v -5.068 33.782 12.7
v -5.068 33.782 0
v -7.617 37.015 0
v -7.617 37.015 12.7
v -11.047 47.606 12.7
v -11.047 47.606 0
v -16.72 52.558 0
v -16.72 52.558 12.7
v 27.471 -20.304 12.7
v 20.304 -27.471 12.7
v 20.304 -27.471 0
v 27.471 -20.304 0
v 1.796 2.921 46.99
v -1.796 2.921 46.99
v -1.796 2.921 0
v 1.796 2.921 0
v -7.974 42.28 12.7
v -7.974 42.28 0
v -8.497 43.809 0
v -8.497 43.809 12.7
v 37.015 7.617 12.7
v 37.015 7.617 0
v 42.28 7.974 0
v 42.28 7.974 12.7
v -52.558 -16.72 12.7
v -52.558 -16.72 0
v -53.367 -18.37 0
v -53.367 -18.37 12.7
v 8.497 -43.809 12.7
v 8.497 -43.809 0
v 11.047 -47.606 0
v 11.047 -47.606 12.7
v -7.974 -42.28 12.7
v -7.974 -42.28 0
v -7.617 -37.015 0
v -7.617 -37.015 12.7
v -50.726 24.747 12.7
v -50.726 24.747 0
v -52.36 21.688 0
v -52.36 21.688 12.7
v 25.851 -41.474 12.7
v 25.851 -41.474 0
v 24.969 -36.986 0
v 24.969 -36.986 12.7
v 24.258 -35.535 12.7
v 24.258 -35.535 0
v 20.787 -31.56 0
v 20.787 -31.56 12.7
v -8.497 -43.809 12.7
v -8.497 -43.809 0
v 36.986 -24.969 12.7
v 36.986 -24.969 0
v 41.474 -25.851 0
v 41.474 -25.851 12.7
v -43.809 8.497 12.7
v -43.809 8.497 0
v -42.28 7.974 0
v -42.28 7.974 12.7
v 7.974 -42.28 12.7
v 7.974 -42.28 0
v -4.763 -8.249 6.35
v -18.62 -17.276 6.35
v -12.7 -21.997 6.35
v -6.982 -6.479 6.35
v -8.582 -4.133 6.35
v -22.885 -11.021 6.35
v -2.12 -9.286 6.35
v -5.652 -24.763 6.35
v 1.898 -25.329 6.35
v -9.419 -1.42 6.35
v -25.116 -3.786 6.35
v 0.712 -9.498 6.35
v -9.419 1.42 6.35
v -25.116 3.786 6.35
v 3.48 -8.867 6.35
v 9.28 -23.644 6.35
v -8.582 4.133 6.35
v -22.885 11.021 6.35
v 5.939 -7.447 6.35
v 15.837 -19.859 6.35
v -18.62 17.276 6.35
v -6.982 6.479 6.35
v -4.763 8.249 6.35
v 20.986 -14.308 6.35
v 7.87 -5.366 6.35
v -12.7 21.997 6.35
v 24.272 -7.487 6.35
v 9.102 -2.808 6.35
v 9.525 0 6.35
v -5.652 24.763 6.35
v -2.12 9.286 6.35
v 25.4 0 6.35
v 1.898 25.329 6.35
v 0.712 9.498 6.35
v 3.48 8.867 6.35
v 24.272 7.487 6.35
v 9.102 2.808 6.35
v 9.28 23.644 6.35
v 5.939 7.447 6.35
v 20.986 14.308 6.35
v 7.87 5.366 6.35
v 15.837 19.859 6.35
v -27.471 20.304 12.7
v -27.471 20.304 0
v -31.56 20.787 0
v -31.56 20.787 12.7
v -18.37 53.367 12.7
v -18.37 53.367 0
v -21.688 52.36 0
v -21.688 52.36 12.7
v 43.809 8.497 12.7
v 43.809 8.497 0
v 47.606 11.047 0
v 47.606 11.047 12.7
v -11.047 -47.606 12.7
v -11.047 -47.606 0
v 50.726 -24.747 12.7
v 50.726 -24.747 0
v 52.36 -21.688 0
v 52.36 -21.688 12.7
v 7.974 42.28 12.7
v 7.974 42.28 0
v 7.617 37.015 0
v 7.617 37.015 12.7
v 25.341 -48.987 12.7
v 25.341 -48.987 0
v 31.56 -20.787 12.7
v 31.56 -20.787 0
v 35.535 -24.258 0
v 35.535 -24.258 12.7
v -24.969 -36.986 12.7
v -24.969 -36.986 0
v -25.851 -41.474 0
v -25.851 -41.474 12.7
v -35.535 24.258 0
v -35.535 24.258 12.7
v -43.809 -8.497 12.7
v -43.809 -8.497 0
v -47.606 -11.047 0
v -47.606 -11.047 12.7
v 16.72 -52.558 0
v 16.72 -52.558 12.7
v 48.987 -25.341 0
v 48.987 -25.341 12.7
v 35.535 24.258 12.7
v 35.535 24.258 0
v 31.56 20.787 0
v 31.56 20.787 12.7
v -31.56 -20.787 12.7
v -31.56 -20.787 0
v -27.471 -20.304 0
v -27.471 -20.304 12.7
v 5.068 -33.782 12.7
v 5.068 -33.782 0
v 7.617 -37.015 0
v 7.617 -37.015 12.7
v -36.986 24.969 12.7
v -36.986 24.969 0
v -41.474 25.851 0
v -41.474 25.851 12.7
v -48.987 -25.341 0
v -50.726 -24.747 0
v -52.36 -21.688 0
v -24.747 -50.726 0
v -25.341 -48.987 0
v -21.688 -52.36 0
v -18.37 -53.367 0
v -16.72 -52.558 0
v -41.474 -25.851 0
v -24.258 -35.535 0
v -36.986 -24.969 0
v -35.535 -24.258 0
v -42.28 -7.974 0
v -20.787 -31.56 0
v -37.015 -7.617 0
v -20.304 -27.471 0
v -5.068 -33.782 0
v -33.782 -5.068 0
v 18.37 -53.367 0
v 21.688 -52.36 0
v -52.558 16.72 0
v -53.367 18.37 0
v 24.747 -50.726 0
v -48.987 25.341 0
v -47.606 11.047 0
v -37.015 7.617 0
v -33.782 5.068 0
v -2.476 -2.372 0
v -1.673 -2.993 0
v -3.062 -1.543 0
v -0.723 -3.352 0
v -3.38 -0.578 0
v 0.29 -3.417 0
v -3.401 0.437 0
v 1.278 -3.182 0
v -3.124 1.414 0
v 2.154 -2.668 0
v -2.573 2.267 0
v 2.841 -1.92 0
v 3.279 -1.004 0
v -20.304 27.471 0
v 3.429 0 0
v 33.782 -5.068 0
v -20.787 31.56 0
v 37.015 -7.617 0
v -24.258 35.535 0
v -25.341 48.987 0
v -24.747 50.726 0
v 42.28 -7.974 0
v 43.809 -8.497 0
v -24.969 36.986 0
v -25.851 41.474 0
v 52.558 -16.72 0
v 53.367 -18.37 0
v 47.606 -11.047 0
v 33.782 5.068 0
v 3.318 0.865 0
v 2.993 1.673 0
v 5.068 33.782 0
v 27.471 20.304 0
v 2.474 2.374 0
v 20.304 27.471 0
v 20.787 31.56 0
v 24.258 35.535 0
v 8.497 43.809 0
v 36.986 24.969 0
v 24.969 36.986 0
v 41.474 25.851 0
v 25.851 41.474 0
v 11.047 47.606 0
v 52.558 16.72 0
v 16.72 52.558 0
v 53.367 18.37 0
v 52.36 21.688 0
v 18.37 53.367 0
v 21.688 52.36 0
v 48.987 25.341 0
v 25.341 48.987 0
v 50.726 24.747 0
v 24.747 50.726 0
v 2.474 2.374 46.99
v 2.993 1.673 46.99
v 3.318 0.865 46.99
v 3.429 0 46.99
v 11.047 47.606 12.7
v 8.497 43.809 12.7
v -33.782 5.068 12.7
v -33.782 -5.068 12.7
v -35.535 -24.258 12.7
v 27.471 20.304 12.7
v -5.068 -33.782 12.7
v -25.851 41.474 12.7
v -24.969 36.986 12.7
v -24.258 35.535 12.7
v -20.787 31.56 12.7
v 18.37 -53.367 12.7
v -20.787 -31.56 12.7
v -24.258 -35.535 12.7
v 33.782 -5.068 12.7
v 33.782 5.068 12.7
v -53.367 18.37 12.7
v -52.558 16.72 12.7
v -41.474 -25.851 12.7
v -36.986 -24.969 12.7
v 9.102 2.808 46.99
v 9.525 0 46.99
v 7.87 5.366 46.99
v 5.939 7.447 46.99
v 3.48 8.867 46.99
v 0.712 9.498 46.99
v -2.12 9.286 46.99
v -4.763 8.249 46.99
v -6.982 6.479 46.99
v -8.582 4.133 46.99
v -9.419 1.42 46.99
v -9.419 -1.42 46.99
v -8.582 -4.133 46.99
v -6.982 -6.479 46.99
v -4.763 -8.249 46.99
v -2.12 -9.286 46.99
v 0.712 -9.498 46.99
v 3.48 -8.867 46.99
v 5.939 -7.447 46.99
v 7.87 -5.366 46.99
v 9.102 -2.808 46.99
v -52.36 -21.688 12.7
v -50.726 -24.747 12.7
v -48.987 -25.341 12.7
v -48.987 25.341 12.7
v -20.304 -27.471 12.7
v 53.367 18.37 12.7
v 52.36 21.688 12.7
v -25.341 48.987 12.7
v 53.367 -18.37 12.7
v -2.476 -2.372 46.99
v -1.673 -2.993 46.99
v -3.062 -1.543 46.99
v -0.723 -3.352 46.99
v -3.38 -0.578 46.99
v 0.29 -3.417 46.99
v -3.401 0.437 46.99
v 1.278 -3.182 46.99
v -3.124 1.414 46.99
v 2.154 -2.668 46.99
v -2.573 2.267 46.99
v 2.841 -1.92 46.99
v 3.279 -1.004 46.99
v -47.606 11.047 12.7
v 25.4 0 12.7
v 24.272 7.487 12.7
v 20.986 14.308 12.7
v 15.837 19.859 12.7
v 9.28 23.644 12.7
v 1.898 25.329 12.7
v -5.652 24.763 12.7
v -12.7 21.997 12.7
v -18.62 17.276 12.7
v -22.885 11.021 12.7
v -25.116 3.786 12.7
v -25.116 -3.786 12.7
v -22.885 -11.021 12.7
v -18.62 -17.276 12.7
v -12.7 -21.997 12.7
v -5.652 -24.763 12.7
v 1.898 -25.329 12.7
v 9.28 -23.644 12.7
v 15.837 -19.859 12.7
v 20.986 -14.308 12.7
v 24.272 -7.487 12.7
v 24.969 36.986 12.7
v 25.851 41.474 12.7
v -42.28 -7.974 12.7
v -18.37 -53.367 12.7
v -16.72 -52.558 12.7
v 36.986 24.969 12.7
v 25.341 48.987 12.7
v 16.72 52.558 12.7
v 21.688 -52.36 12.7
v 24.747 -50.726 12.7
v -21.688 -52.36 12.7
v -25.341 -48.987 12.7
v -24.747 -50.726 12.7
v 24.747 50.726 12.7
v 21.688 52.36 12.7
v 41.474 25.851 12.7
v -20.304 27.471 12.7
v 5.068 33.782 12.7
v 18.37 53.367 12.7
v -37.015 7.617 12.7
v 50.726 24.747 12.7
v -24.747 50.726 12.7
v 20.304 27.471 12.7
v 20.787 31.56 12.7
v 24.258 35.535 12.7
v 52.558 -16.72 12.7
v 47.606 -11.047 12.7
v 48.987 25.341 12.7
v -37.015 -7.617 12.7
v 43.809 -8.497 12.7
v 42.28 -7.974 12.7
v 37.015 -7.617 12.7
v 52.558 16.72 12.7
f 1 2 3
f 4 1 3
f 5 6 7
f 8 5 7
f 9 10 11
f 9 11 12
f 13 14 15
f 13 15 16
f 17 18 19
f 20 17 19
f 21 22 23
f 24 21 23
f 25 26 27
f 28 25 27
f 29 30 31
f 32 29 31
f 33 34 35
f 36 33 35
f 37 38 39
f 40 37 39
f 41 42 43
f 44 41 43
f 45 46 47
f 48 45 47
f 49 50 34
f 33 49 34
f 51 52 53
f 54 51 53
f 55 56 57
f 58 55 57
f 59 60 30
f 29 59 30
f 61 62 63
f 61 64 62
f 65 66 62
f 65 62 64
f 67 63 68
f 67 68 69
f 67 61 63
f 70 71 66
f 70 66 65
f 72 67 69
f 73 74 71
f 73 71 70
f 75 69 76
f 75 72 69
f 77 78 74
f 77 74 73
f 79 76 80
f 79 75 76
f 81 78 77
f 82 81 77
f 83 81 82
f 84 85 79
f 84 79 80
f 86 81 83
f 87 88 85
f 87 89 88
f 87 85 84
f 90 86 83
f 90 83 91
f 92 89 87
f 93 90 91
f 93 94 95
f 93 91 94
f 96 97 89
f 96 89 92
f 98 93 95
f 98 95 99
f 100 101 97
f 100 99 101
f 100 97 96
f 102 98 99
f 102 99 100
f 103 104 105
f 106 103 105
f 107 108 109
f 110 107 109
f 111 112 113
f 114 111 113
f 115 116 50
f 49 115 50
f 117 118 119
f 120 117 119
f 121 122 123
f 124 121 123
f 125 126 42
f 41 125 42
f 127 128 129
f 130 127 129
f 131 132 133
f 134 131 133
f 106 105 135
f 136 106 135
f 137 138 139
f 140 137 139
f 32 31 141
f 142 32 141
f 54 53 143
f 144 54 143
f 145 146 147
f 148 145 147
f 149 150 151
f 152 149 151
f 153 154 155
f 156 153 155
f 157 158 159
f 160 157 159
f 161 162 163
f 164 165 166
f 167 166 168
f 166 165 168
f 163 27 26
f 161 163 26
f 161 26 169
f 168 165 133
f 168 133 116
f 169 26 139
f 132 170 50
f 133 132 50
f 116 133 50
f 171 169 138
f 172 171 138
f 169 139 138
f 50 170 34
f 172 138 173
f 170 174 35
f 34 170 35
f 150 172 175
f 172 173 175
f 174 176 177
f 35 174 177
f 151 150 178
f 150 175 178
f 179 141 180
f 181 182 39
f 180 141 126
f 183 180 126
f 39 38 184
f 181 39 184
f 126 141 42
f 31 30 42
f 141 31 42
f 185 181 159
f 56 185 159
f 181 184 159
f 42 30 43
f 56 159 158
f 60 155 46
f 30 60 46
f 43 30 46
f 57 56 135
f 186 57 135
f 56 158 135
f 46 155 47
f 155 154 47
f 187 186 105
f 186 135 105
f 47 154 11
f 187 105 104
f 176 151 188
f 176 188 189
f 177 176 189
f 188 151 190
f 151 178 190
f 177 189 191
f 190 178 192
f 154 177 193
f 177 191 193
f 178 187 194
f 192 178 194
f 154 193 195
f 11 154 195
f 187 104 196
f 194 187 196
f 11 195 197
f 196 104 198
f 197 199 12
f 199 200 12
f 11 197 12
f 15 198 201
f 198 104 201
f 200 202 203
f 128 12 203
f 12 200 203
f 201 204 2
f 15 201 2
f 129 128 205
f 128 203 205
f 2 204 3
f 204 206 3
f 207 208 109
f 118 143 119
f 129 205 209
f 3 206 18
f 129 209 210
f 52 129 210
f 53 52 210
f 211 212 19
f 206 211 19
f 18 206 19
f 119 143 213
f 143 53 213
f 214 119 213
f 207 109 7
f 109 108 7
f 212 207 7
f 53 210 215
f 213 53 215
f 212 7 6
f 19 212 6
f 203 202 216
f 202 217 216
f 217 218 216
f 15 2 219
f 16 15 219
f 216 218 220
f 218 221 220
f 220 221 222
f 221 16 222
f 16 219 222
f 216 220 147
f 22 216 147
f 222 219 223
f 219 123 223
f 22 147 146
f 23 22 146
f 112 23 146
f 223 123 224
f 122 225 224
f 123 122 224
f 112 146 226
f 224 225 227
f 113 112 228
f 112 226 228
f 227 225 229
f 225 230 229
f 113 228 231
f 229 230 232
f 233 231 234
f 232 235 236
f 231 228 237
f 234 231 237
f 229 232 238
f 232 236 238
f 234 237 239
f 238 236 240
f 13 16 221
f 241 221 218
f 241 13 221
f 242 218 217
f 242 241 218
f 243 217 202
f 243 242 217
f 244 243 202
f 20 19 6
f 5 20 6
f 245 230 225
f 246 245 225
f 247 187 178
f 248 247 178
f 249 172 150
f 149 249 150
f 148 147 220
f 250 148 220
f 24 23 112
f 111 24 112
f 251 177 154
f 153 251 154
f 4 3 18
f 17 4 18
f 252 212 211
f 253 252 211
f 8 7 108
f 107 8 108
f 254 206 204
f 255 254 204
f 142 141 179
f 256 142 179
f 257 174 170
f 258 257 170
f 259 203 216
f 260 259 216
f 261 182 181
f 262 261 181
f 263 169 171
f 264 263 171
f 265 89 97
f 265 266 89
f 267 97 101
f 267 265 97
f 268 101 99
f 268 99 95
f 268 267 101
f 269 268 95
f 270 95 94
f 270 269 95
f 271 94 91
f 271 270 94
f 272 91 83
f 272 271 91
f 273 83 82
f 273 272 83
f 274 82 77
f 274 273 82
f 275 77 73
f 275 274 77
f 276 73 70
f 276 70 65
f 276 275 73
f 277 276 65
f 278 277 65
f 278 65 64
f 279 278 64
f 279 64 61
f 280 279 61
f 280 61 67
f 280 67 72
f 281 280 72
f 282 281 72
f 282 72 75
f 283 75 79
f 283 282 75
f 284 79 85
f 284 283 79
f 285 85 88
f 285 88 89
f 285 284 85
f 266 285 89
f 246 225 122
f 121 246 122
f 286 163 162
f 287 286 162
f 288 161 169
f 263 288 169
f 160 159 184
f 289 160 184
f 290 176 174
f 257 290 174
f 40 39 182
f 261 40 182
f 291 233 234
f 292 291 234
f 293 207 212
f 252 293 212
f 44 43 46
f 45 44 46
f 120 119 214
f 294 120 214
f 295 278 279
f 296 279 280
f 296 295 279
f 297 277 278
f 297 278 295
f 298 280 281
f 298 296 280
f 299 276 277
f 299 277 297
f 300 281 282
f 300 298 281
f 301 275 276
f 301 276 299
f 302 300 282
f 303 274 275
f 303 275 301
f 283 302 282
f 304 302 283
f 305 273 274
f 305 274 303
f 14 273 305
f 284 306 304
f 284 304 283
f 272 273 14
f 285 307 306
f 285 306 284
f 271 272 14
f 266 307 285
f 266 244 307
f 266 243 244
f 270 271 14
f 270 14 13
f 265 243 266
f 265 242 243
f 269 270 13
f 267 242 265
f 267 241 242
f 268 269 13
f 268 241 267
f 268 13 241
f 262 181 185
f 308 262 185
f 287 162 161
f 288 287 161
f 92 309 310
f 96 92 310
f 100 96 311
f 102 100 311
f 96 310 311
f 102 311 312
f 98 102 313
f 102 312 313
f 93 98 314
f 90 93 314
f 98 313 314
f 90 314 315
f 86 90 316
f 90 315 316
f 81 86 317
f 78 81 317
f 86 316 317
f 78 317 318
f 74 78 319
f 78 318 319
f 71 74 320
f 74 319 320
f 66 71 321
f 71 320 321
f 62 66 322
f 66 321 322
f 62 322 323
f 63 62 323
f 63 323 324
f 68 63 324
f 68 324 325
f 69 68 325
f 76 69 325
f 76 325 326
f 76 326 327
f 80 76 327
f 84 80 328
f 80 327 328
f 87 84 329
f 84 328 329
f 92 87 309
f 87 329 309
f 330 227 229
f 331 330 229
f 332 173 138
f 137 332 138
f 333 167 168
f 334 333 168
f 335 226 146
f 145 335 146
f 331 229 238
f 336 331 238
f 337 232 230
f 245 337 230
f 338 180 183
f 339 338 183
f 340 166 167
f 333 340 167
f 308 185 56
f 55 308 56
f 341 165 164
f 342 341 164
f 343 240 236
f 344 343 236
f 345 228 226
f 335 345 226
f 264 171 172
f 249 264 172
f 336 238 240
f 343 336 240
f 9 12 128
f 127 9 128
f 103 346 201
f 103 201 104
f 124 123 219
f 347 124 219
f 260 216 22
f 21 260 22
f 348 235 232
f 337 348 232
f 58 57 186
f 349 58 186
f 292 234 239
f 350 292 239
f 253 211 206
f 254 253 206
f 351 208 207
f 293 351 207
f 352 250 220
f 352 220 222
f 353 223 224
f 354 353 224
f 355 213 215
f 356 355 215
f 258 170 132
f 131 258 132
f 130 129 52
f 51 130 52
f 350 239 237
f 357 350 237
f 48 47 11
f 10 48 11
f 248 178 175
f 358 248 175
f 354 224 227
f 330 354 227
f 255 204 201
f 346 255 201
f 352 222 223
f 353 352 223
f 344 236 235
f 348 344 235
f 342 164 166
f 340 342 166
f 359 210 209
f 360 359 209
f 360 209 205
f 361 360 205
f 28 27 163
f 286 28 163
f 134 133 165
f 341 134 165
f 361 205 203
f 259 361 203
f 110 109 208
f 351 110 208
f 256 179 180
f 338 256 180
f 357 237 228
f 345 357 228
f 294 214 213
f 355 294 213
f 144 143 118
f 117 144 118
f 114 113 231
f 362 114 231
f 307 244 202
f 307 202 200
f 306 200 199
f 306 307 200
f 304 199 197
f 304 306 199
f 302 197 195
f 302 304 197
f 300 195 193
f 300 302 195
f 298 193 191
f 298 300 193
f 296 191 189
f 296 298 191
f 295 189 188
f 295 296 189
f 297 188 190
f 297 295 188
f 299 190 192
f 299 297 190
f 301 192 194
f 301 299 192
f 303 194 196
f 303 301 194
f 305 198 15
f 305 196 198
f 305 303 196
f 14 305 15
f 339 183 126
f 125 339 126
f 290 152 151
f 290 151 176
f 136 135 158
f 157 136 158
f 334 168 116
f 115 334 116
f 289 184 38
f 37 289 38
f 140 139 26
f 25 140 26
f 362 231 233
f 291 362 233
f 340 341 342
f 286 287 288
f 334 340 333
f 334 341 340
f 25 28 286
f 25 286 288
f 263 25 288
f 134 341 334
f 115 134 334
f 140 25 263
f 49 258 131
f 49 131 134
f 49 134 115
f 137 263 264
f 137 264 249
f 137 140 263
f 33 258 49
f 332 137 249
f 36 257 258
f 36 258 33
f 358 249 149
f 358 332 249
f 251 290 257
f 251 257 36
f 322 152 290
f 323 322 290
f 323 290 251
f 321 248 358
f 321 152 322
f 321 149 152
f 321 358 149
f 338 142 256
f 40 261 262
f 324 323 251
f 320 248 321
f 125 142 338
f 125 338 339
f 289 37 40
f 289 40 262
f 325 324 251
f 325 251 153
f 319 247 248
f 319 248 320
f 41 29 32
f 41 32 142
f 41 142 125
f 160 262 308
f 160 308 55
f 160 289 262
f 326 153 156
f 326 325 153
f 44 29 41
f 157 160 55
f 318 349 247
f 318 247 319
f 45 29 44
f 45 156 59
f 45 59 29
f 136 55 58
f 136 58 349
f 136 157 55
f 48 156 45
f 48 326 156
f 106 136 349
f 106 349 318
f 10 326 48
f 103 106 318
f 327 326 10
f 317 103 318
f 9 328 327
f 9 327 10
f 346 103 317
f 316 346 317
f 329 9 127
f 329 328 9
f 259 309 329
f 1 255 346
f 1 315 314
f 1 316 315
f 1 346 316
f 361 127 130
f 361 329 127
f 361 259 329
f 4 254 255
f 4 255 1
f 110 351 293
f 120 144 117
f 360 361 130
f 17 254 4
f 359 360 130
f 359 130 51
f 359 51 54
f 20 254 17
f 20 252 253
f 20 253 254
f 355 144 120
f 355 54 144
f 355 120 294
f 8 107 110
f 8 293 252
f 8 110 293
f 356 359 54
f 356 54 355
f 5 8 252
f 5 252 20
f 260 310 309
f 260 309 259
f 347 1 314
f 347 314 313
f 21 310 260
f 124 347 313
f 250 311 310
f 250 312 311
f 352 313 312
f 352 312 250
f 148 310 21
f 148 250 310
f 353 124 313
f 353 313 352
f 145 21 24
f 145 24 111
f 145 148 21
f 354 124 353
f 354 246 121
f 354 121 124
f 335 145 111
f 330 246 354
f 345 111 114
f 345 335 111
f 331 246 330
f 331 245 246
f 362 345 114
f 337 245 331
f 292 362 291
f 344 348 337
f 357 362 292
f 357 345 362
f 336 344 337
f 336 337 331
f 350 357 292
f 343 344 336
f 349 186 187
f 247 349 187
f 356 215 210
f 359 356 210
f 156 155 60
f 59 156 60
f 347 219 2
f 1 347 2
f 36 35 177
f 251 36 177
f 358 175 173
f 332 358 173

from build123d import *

# Parameters (mm, degrees)
F1_DEPTH = 12.7
F2_R     = 9.525
F3_DEPTH = 34.29
F4_DEPTH = 25.4
F2_R_2   = 25.4
F5_DEPTH = 6.35


with BuildPart() as f1:
    # F0 (on Top) → F1 (new body)
    with BuildSketch(Plane.XY):
        Polygon((-48.986719159, 25.3412460777), (-50.7255351294, 24.7465363945), (-52.3601977854, 21.688304154), (-53.366815822, 18.3699267661), (-52.5578082129, 16.719871907), (-47.6057296253, 11.0468524364), (-43.80914346, 8.4974130761), (-42.2801519731, 7.9744654227), (-37.0147232049, 7.6171909331), (-33.782, 5.0679251692), (-33.782, -5.0679251692), (-37.0147232049, -7.6171909331), (-42.2801519731, -7.9744654227), (-43.80914346, -8.4974130761), (-47.6057296253, -11.0468524364), (-52.5578082129, -16.719871907), (-53.366815822, -18.3699267661), (-52.3601977854, -21.688304154), (-50.7255351294, -24.7465363945), (-48.986719159, -25.3412460777), (-41.4736370284, -25.8510271212), (-36.9863201834, -24.9691669416), (-35.5353802528, -24.2577827562), (-31.559527, -20.7871925925), (-27.4710453735, -20.303918365), (-20.303918365, -27.4710453735), (-20.7871925925, -31.559527), (-24.2577827562, -35.5353802528), (-24.9691669416, -36.9863201834), (-25.8510271212, -41.4736370284), (-25.3412460777, -48.986719159), (-24.7465363945, -50.7255351294), (-21.688304154, -52.3601977854), (-18.3699267661, -53.366815822), (-16.719871907, -52.5578082129), (-11.0468524364, -47.6057296253), (-8.4974130761, -43.80914346), (-7.9744654227, -42.2801519731), (-7.6171909331, -37.0147232049), (-5.0679251692, -33.782), (5.0679251692, -33.782), (7.6171909331, -37.0147232049), (7.9744654227, -42.2801519731), (8.4974130761, -43.80914346), (11.0468524364, -47.6057296253), (16.719871907, -52.5578082129), (18.3699267661, -53.366815822), (21.688304154, -52.3601977854), (24.7465363945, -50.7255351294), (25.3412460777, -48.986719159), (25.8510271212, -41.4736370284), (24.9691669416, -36.9863201834), (24.2577827562, -35.5353802528), (20.7871925925, -31.559527), (20.303918365, -27.4710453735), (27.4710453735, -20.303918365), (31.559527, -20.7871925925), (35.5353802528, -24.2577827562), (36.9863201834, -24.9691669416), (41.4736370284, -25.8510271212), (48.986719159, -25.3412460777), (50.7255351294, -24.7465363945), (52.3601977854, -21.688304154), (53.366815822, -18.3699267661), (52.5578082129, -16.719871907), (47.6057296253, -11.0468524364), (43.80914346, -8.4974130761), (42.2801519731, -7.9744654227), (37.0147232049, -7.6171909331), (33.782, -5.0679251692), (33.782, 5.0679251692), (37.0147232049, 7.6171909331), (42.2801519731, 7.9744654227), (43.80914346, 8.4974130761), (47.6057296253, 11.0468524364), (52.5578082129, 16.719871907), (53.366815822, 18.3699267661), (52.3601977854, 21.688304154), (50.7255351294, 24.7465363945), (48.986719159, 25.3412460777), (41.4736370284, 25.8510271212), (36.9863201834, 24.9691669416), (35.5353802528, 24.2577827562), (31.559527, 20.7871925925), (27.4710453735, 20.303918365), (20.303918365, 27.4710453735), (20.7871925925, 31.559527), (24.2577827562, 35.5353802528), (24.9691669416, 36.9863201834), (25.8510271212, 41.4736370284), (25.3412460777, 48.986719159), (24.7465363945, 50.7255351294), (21.688304154, 52.3601977854), (18.3699267661, 53.366815822), (16.719871907, 52.5578082129), (11.0468524364, 47.6057296253), (8.4974130761, 43.80914346), (7.9744654227, 42.2801519731), (7.6171909331, 37.0147232049), (5.0679251692, 33.782), (-5.0679251692, 33.782), (-7.6171909331, 37.0147232049), (-7.9744654227, 42.2801519731), (-8.4974130761, 43.80914346), (-11.0468524364, 47.6057296253), (-16.719871907, 52.5578082129), (-18.3699267661, 53.366815822), (-21.688304154, 52.3601977854), (-24.7465363945, 50.7255351294), (-25.3412460777, 48.986719159), (-25.8510271212, 41.4736370284), (-24.9691669416, 36.9863201834), (-24.2577827562, 35.5353802528), (-20.7871925925, 31.559527), (-20.303918365, 27.4710453735), (-27.4710453735, 20.303918365), (-31.559527, 20.7871925925), (-35.5353802528, 24.2577827562), (-36.9863201834, 24.9691669416), (-41.4736370284, 25.8510271212), align=None)
        Polygon((-6.457554456, 6.1279886028), (-5.0423575535, 7.3366771559), (-3.4067913067, 8.2247200336), (-1.622328418, 8.7533028893), (0.2330374214, 8.8993240645), (2.0782189459, 8.6564005578), (3.8325695574, 8.0351529003), (5.4194220185, 7.0627288788), (6.7694179402, 5.7816284228), (7.8235568446, 4.247847459), (8.5357689507, 2.5284119549), (8.8749315621, 0.6984712932), (8.8262133252, -1.1619911548), (8.3917463583, -2.9716744665), (7.5905194232, -4.6514766054), (6.457554456, -6.1279886028), (5.0423575535, -7.3366771559), (3.4067913067, -8.2247200336), (1.622328418, -8.7533028893), (-0.2330374214, -8.8993240645), (-2.0782189459, -8.6564005578), (-3.8325695574, -8.0351529003), (-5.4194220185, -7.0627288788), (-6.7694179402, -5.7816284228), (-7.8235568446, -4.247847459), (-8.5357689507, -2.5284119549), (-8.8749315621, -0.6984712932), (-8.8262133252, 1.1619911548), (-8.3917463583, 2.9716744665), (-7.5905194232, 4.6514766054), align=None, mode=Mode.SUBTRACT)
        Polygon((-3.4067913067, 8.2247200336), (-5.0423575535, 7.3366771559), (-6.457554456, 6.1279886028), (-7.5905194232, 4.6514766054), (-8.3917463583, 2.9716744665), (-8.8262133252, 1.1619911548), (-8.8749315621, -0.6984712932), (-8.5357689507, -2.5284119549), (-7.8235568446, -4.247847459), (-6.7694179402, -5.7816284228), (-5.4194220185, -7.0627288788), (-3.8325695574, -8.0351529003), (-2.0782189459, -8.6564005578), (-0.2330374214, -8.8993240645), (1.622328418, -8.7533028893), (3.4067913067, -8.2247200336), (5.0423575535, -7.3366771559), (6.457554456, -6.1279886028), (7.5905194232, -4.6514766054), (8.3917463583, -2.9716744665), (8.8262133252, -1.1619911548), (8.8749315621, 0.6984712932), (8.5357689507, 2.5284119549), (7.8235568446, 4.247847459), (6.7694179402, 5.7816284228), (5.4194220185, 7.0627288788), (3.8325695574, 8.0351529003), (2.0782189459, 8.6564005578), (0.2330374214, 8.8993240645), (-1.622328418, 8.7533028893), align=None)
    extrude(amount=F1_DEPTH)

    # F2 (on face) → F3 (join)
    with BuildSketch(Plane.XY.offset(12.7)):
        Circle(F2_R)
        with BuildLine():
            ThreePointArc((1.7960512242, 2.921), (2.9930503377, 1.6732276223), (3.429, 0))
            ThreePointArc((3.429, 0), (-1.6732276223, -2.9930503377), (-1.7960512242, 2.921))
            ThreePointArc((-1.7960512242, 2.921), (0, 3.429), (1.7960512242, 2.921))
        make_face(mode=Mode.SUBTRACT)
        with BuildLine():
            Line((-1.7960512242, 2.921), (1.7960512242, 2.921))
            ThreePointArc((1.7960512242, 2.921), (0, 3.429), (-1.7960512242, 2.921))
        make_face()
    extrude(amount=F3_DEPTH)

    # F4 (cut): a face of the model
    f4_faces = [f1.faces().sort_by_distance(p)[0] for p in [
        (0, -0.108182678, 12.7),
    ]]
    extrude(f4_faces, amount=-F4_DEPTH, mode=Mode.SUBTRACT)

    # F2 (on face) → F5 (cut)
    with BuildSketch(Plane.XY.offset(12.7)):
        Circle(F2_R_2)
        Circle(F2_R, mode=Mode.SUBTRACT)
    extrude(amount=-F5_DEPTH, mode=Mode.SUBTRACT)


solid = f1.part
